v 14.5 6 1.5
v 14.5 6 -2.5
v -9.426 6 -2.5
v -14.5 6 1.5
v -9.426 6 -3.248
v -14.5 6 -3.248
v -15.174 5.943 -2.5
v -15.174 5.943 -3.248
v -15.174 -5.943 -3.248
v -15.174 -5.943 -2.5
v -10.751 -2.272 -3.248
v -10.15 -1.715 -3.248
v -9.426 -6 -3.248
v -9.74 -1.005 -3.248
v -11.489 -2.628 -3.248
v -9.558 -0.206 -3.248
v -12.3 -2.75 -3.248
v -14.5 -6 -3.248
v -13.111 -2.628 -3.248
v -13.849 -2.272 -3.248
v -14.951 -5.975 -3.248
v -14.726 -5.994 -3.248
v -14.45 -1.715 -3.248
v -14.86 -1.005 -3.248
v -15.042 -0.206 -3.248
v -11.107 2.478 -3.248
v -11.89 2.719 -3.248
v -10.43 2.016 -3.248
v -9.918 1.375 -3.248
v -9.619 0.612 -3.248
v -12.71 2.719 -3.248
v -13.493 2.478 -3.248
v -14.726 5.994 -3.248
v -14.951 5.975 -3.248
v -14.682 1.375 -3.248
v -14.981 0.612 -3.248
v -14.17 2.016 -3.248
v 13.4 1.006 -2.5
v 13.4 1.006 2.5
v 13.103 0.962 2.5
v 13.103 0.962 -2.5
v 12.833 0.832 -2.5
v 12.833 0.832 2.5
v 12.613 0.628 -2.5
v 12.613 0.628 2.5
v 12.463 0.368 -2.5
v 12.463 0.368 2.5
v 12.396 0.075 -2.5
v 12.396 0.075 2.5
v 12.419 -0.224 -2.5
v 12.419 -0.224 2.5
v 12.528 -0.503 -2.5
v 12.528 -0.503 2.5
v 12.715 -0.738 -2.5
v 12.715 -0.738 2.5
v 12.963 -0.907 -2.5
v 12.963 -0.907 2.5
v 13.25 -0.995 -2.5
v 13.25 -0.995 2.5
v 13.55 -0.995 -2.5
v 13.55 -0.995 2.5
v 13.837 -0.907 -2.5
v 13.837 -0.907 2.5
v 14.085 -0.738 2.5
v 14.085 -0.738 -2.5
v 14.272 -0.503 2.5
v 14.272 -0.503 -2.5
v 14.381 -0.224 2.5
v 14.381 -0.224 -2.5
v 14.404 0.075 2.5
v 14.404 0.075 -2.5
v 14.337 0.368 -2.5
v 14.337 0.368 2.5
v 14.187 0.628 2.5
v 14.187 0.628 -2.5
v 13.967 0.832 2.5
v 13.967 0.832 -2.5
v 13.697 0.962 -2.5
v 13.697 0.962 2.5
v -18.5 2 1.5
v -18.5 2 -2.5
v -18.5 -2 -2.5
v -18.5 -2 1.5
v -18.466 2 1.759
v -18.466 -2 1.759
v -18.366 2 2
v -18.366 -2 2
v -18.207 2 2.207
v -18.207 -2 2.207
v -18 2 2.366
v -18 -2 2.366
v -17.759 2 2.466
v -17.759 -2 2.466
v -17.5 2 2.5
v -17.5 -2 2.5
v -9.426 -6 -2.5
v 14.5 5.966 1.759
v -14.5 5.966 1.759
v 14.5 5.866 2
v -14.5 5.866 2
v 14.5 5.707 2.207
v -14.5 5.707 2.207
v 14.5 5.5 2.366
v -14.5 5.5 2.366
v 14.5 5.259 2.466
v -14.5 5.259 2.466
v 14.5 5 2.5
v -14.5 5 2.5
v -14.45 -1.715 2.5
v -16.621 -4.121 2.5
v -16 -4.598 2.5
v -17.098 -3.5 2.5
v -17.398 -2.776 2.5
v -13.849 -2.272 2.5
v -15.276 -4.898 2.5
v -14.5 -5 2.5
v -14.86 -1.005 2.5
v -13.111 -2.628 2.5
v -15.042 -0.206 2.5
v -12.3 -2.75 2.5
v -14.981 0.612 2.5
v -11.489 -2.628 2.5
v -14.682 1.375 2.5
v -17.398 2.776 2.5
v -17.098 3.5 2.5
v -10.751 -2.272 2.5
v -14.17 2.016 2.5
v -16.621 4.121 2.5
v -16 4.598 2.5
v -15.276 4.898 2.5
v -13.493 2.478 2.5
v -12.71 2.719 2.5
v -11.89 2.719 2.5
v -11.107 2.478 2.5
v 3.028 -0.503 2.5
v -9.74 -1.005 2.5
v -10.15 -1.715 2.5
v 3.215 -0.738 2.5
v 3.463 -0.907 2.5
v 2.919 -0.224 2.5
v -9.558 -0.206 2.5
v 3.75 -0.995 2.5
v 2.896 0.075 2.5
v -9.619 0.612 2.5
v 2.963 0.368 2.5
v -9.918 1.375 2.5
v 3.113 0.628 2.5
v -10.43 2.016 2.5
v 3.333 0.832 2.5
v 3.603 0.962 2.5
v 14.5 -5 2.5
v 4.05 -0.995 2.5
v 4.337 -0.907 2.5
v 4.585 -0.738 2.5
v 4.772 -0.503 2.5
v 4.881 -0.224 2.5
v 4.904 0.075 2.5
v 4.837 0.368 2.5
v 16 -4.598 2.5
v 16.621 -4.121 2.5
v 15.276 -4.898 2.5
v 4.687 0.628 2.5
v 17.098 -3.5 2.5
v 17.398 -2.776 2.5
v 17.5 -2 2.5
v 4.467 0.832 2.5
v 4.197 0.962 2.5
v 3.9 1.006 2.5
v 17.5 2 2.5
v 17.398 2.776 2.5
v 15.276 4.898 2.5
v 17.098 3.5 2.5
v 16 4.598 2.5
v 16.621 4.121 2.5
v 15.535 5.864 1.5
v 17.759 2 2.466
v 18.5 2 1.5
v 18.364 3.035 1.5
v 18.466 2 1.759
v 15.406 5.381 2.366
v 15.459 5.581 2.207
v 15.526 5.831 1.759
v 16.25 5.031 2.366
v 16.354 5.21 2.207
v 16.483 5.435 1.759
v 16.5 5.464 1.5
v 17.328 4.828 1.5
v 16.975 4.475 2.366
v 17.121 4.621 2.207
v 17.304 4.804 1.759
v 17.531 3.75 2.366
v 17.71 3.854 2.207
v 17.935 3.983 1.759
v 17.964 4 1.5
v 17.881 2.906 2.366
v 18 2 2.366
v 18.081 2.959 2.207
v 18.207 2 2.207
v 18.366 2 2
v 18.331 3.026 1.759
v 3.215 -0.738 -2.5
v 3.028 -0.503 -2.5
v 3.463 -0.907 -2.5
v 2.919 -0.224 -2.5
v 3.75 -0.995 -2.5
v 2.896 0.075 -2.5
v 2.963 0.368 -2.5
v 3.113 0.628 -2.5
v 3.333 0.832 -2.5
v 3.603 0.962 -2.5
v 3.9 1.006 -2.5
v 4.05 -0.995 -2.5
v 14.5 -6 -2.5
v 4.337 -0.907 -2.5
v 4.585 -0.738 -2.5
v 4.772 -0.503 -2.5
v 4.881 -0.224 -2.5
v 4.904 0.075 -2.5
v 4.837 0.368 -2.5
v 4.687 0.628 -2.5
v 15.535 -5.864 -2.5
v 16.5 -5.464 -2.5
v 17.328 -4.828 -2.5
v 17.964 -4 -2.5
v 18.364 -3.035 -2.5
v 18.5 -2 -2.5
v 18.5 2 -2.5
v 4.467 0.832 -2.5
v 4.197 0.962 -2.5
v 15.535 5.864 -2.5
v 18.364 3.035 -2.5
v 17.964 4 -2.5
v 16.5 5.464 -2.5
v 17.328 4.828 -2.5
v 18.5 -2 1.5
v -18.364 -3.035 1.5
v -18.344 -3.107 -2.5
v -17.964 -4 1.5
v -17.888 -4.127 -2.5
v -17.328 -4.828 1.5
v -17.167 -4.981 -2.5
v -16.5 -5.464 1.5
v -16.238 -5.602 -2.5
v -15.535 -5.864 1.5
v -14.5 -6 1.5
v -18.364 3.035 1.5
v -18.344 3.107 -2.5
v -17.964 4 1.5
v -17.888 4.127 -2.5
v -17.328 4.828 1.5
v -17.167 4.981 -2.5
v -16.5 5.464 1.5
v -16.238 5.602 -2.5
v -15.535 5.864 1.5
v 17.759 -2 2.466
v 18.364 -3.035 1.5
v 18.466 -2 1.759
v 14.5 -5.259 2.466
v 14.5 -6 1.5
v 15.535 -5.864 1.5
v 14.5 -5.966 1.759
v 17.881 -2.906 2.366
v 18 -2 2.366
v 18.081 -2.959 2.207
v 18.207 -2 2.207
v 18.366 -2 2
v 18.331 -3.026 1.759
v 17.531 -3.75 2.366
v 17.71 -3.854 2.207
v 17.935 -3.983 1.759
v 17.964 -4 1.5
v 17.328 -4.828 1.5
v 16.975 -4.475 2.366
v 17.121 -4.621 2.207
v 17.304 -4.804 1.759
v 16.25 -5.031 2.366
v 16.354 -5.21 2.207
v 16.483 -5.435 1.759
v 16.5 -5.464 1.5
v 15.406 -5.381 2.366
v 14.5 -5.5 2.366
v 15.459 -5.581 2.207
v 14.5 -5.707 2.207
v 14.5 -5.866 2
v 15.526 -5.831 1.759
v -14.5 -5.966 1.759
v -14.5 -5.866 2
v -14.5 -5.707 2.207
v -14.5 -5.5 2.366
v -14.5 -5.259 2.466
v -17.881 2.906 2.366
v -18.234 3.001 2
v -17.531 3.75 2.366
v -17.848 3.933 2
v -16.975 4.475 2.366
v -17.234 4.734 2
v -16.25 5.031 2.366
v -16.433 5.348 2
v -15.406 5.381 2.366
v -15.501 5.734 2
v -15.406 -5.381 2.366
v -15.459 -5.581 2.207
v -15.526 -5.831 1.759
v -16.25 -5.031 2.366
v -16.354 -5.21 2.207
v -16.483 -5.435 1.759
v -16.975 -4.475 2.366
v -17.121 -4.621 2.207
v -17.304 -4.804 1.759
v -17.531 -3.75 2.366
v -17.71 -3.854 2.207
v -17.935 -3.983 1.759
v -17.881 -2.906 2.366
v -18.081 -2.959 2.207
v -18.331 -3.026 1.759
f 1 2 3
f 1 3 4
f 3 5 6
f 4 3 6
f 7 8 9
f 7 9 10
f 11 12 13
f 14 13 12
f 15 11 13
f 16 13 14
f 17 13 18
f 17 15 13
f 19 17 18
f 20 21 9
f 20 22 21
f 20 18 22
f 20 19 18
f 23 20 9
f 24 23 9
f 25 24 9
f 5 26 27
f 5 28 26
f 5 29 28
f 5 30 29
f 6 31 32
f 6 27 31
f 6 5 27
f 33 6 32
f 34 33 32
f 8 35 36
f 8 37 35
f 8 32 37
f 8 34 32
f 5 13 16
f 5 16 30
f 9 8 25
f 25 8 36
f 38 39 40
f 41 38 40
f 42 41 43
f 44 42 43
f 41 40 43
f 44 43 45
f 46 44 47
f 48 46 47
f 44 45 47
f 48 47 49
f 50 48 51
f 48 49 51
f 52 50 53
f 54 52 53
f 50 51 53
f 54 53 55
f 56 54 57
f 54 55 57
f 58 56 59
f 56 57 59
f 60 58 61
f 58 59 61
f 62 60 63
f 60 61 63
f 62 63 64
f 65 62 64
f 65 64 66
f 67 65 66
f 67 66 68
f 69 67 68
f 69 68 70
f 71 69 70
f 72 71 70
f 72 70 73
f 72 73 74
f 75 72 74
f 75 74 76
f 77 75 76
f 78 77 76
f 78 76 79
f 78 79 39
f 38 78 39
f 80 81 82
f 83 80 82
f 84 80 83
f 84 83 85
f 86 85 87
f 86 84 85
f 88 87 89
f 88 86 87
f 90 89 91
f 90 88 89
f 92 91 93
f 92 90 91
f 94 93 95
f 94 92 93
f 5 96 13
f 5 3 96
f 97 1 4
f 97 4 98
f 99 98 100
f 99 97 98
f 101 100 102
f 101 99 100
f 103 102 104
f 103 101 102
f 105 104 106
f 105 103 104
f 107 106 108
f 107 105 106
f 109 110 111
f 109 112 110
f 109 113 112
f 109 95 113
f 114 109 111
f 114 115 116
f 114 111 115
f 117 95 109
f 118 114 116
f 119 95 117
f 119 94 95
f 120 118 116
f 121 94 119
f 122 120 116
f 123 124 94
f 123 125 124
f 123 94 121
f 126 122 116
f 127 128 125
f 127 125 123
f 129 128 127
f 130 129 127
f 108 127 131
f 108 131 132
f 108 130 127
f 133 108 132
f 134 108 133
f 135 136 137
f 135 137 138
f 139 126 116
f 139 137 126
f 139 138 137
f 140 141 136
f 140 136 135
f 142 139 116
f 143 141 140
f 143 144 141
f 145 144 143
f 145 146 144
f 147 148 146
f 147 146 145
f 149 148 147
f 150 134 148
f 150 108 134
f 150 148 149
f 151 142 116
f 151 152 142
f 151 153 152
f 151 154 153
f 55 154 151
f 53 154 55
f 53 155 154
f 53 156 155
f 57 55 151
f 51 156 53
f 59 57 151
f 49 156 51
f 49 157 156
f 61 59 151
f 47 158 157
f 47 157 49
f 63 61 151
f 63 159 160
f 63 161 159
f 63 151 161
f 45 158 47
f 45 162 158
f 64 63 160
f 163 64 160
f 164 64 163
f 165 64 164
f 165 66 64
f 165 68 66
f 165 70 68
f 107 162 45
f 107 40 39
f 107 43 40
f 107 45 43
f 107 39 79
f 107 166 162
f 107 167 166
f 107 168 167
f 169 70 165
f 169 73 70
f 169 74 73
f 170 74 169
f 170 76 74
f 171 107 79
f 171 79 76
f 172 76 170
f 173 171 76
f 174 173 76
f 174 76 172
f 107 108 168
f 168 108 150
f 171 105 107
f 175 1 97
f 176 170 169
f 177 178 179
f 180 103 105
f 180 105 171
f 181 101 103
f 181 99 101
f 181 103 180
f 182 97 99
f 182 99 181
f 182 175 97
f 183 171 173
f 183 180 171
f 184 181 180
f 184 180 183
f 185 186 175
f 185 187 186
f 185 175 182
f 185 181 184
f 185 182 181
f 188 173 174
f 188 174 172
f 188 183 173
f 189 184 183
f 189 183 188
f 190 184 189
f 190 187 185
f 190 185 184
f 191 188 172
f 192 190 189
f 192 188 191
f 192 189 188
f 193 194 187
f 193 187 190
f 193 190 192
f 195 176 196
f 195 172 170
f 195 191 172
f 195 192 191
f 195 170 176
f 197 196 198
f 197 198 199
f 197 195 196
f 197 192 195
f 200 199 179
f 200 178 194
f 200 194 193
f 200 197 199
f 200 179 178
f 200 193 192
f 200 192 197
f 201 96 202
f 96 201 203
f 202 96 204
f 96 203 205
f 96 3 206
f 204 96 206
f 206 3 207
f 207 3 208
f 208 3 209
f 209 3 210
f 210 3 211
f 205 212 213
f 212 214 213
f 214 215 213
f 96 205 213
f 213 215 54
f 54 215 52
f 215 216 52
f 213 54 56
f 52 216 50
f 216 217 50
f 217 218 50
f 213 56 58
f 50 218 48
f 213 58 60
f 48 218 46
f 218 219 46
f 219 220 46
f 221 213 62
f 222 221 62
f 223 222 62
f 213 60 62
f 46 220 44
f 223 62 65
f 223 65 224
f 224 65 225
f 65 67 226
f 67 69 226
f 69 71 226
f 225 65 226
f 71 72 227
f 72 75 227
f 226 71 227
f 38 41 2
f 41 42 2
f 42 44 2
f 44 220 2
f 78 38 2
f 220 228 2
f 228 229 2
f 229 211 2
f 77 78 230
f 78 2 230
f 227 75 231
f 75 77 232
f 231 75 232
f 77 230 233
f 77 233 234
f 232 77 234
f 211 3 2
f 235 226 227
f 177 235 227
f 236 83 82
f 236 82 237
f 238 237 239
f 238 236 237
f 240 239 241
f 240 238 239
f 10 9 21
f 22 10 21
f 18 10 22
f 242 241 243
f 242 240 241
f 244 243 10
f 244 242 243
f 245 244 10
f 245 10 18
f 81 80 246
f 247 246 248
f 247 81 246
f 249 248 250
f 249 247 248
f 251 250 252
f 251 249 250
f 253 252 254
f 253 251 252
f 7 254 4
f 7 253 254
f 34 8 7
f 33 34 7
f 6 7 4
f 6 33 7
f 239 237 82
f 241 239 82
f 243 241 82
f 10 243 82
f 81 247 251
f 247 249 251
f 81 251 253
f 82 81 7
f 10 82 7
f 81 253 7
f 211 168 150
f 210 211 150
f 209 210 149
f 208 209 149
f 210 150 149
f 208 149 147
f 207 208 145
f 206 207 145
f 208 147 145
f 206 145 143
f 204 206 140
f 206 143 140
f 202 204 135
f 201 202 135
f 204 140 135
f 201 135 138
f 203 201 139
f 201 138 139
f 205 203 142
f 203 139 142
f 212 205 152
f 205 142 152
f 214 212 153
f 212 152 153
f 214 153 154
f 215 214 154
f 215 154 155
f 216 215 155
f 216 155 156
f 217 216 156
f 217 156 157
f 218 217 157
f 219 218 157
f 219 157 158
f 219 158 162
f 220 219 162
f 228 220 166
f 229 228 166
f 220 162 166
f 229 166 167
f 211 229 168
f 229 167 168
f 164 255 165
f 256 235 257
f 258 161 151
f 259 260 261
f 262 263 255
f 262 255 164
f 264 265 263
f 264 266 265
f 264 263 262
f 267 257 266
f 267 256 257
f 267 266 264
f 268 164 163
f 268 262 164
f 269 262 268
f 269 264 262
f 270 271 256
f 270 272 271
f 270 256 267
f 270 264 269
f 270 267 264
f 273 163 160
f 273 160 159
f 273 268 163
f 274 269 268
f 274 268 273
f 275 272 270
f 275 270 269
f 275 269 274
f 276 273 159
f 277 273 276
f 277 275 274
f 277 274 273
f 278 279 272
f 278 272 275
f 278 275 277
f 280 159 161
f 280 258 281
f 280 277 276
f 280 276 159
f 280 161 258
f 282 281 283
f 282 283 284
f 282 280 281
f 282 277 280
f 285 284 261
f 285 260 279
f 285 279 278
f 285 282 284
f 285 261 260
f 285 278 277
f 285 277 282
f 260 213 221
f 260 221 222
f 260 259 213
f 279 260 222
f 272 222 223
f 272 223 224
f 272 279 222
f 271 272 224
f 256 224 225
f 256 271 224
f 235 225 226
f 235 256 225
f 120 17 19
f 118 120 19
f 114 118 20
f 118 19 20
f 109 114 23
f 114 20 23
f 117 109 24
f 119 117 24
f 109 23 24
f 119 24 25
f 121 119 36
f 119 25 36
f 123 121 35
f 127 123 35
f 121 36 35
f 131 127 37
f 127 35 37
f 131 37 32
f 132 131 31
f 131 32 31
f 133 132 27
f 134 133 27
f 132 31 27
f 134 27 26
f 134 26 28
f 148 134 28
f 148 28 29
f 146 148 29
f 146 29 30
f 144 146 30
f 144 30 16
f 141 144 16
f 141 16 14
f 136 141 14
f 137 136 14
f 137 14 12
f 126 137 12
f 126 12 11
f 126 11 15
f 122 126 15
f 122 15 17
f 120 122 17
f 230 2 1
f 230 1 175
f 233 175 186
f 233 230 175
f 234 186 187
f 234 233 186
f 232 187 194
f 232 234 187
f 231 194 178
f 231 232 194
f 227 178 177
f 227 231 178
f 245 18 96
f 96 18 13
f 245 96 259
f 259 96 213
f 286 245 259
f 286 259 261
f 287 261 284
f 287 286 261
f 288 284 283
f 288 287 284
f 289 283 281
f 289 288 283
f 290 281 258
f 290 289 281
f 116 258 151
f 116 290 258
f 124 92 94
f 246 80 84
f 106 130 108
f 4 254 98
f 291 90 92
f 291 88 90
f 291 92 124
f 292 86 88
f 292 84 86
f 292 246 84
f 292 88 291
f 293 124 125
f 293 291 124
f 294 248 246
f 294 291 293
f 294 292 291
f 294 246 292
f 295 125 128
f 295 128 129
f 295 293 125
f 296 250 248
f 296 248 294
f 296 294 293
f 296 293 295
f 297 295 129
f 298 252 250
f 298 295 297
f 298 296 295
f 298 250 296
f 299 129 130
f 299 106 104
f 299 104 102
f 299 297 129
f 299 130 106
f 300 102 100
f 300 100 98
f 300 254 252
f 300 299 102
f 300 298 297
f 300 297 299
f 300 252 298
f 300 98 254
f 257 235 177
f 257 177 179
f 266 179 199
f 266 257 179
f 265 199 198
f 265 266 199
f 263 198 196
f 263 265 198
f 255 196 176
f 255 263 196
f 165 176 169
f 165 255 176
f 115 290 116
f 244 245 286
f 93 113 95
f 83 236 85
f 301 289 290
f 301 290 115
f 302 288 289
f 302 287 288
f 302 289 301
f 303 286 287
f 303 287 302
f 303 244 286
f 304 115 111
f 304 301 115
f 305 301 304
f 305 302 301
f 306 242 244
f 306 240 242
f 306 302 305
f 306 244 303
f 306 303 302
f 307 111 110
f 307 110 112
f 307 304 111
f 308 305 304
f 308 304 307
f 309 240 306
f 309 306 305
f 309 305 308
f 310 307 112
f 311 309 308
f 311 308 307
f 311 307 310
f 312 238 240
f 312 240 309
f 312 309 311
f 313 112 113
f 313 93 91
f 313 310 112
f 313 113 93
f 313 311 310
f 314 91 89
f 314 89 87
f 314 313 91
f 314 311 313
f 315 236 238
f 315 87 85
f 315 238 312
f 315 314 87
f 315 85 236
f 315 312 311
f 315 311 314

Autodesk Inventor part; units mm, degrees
ref_plane "YZ Plane" through (0, 0, 0) normal (1, 0, 0) x (0, 1, 0)
ref_plane "XZ Plane" through (0, 0, 0) normal (0, 1, 0) x (-1, 0, 0)
ref_plane "XY Plane" through (0, 0, 0) normal (0, 0, 1) x (1, 0, 0)
sketch "Sketch1" plane through (0, 0, 0) normal (0, 0, 1) x (1, 0, 0)
  line L0 (-18.5, -6) -> (18.5, -6)
  line L1 (18.5, -6) -> (18.5, 6)
  line L2 (18.5, 6) -> (-18.5, 6)
  line L3 (-18.5, 6) -> (-18.5, -6)
  line L4 (-18.5, -6) -> (18.5, 6) construction
  line L5 (18.5, -6) -> (-18.5, 6) construction
  point P0 (0, 0)
  dimension "d0" = 37
  dimension "d1" = 12
extrude "Extrusion1" add sketch "Sketch1" along normal mid plane 5
sketch "Sketch2" plane through (-18.5, 6, 2.5) normal (0, 1, 0) x (1, 0, 0)
  line L0 (3.2, 5.874) -> (9.2, 5.874)
  line L1 (9.2, 5.874) -> (9.2, 4.874)
  line L2 (9.2, 4.874) -> (3.2, 4.874)
  line L3 (3.2, 4.874) -> (3.2, 5.874)
  line L4 (3.2, 5.874) -> (9.2, 4.874) construction
  line L5 (9.2, 5.874) -> (3.2, 4.874) construction
  line L6 (37, 5) -> (37, 0) projected
  line L7 (9.074, 5.748) -> (3.326, 5.748)
  line L8 (3.326, 5.748) -> (3.326, 5)
  line L9 (3.326, 5) -> (9.074, 5)
  line L10 (9.074, 5) -> (9.074, 5.748)
  line L11 (0, 5) -> (37, 5) projected
  point P0 (18.5, 2.5)
  point P1 (6.2, 5.374)
  dimension "d4" = 27.8
  dimension "d5" = 1
  dimension "d6" = 6
  dimension "d7" = 0.126
extrude "Extrusion2" add sketch "Sketch2" against normal up to surface (12 mm away) contours L8 L7 L10 L9
sketch "Sketch3" plane through (0, 0, 2.5) normal (0, 0, 1) x (1, 0, 0)
  line L0 (-18.5, -6) -> (18.5, -6) projected
  line L1 (-9.426, -6) -> (-15.174, -6) projected
  line L2 (-15.174, 6) -> (-15.174, -6) projected
  line L3 (-9.426, 6) -> (-15.174, 6) projected
  line L4 (-9.426, 6) -> (-9.426, -6) projected
  point P0 (0, 0)
  point P1 (-12.3, 0)
  point P2 (-12.3, 6)
  point P3 (-9.426, 0)
hole "Hole1" at (-12.3, 0, 2.5) direction (0, 0, -1) diameter 5.5 depth 14.2 clearance for "Socket Head Cap Screw" size "M5" standard "Ansi Metric M Profile"
fillet "Fillet1" radius 4 4 edges at (-18.5, 6, 0) (-18.5, -6, 0) (18.5, -6, 0) (18.5, 6, 0)
fillet "Fillet2" radius 1 8 edges at (-17.3284, 4.8284, 2.5) (-18.5, 0, 2.5) (-17.3284, -4.8284, 2.5) (0, -6, 2.5) (17.3284, -4.8284, 2.5) (18.5, 0, 2.5) (17.3284, 4.8284, 2.5) (0, 6, 2.5)
sketch "Sketch4" plane through (0, 0, -2.5) normal (0, 0, -1) x (-1, 0, 0)
  line L0 (-18.5, 2) -> (-18.5, -2) projected
  point P0 (0, 0)
  point P1 (-13.4, 0)
  point P2 (-3.9, 0)
  dimension "d19" = 5.1
  dimension "d20" = 14.6
hole "Hole2" at (13.4, 0, -2.5) at (3.9, 0, -2.5) direction (0, 0, 1) diameter 2.013 depth 7.6 thread size "M2.5x0.45" class "6H" standard "ANSI Metric M Profile"
properties part number "Frame_Z_Endstop_Mount_LM3048" material "ABS Plastic"
